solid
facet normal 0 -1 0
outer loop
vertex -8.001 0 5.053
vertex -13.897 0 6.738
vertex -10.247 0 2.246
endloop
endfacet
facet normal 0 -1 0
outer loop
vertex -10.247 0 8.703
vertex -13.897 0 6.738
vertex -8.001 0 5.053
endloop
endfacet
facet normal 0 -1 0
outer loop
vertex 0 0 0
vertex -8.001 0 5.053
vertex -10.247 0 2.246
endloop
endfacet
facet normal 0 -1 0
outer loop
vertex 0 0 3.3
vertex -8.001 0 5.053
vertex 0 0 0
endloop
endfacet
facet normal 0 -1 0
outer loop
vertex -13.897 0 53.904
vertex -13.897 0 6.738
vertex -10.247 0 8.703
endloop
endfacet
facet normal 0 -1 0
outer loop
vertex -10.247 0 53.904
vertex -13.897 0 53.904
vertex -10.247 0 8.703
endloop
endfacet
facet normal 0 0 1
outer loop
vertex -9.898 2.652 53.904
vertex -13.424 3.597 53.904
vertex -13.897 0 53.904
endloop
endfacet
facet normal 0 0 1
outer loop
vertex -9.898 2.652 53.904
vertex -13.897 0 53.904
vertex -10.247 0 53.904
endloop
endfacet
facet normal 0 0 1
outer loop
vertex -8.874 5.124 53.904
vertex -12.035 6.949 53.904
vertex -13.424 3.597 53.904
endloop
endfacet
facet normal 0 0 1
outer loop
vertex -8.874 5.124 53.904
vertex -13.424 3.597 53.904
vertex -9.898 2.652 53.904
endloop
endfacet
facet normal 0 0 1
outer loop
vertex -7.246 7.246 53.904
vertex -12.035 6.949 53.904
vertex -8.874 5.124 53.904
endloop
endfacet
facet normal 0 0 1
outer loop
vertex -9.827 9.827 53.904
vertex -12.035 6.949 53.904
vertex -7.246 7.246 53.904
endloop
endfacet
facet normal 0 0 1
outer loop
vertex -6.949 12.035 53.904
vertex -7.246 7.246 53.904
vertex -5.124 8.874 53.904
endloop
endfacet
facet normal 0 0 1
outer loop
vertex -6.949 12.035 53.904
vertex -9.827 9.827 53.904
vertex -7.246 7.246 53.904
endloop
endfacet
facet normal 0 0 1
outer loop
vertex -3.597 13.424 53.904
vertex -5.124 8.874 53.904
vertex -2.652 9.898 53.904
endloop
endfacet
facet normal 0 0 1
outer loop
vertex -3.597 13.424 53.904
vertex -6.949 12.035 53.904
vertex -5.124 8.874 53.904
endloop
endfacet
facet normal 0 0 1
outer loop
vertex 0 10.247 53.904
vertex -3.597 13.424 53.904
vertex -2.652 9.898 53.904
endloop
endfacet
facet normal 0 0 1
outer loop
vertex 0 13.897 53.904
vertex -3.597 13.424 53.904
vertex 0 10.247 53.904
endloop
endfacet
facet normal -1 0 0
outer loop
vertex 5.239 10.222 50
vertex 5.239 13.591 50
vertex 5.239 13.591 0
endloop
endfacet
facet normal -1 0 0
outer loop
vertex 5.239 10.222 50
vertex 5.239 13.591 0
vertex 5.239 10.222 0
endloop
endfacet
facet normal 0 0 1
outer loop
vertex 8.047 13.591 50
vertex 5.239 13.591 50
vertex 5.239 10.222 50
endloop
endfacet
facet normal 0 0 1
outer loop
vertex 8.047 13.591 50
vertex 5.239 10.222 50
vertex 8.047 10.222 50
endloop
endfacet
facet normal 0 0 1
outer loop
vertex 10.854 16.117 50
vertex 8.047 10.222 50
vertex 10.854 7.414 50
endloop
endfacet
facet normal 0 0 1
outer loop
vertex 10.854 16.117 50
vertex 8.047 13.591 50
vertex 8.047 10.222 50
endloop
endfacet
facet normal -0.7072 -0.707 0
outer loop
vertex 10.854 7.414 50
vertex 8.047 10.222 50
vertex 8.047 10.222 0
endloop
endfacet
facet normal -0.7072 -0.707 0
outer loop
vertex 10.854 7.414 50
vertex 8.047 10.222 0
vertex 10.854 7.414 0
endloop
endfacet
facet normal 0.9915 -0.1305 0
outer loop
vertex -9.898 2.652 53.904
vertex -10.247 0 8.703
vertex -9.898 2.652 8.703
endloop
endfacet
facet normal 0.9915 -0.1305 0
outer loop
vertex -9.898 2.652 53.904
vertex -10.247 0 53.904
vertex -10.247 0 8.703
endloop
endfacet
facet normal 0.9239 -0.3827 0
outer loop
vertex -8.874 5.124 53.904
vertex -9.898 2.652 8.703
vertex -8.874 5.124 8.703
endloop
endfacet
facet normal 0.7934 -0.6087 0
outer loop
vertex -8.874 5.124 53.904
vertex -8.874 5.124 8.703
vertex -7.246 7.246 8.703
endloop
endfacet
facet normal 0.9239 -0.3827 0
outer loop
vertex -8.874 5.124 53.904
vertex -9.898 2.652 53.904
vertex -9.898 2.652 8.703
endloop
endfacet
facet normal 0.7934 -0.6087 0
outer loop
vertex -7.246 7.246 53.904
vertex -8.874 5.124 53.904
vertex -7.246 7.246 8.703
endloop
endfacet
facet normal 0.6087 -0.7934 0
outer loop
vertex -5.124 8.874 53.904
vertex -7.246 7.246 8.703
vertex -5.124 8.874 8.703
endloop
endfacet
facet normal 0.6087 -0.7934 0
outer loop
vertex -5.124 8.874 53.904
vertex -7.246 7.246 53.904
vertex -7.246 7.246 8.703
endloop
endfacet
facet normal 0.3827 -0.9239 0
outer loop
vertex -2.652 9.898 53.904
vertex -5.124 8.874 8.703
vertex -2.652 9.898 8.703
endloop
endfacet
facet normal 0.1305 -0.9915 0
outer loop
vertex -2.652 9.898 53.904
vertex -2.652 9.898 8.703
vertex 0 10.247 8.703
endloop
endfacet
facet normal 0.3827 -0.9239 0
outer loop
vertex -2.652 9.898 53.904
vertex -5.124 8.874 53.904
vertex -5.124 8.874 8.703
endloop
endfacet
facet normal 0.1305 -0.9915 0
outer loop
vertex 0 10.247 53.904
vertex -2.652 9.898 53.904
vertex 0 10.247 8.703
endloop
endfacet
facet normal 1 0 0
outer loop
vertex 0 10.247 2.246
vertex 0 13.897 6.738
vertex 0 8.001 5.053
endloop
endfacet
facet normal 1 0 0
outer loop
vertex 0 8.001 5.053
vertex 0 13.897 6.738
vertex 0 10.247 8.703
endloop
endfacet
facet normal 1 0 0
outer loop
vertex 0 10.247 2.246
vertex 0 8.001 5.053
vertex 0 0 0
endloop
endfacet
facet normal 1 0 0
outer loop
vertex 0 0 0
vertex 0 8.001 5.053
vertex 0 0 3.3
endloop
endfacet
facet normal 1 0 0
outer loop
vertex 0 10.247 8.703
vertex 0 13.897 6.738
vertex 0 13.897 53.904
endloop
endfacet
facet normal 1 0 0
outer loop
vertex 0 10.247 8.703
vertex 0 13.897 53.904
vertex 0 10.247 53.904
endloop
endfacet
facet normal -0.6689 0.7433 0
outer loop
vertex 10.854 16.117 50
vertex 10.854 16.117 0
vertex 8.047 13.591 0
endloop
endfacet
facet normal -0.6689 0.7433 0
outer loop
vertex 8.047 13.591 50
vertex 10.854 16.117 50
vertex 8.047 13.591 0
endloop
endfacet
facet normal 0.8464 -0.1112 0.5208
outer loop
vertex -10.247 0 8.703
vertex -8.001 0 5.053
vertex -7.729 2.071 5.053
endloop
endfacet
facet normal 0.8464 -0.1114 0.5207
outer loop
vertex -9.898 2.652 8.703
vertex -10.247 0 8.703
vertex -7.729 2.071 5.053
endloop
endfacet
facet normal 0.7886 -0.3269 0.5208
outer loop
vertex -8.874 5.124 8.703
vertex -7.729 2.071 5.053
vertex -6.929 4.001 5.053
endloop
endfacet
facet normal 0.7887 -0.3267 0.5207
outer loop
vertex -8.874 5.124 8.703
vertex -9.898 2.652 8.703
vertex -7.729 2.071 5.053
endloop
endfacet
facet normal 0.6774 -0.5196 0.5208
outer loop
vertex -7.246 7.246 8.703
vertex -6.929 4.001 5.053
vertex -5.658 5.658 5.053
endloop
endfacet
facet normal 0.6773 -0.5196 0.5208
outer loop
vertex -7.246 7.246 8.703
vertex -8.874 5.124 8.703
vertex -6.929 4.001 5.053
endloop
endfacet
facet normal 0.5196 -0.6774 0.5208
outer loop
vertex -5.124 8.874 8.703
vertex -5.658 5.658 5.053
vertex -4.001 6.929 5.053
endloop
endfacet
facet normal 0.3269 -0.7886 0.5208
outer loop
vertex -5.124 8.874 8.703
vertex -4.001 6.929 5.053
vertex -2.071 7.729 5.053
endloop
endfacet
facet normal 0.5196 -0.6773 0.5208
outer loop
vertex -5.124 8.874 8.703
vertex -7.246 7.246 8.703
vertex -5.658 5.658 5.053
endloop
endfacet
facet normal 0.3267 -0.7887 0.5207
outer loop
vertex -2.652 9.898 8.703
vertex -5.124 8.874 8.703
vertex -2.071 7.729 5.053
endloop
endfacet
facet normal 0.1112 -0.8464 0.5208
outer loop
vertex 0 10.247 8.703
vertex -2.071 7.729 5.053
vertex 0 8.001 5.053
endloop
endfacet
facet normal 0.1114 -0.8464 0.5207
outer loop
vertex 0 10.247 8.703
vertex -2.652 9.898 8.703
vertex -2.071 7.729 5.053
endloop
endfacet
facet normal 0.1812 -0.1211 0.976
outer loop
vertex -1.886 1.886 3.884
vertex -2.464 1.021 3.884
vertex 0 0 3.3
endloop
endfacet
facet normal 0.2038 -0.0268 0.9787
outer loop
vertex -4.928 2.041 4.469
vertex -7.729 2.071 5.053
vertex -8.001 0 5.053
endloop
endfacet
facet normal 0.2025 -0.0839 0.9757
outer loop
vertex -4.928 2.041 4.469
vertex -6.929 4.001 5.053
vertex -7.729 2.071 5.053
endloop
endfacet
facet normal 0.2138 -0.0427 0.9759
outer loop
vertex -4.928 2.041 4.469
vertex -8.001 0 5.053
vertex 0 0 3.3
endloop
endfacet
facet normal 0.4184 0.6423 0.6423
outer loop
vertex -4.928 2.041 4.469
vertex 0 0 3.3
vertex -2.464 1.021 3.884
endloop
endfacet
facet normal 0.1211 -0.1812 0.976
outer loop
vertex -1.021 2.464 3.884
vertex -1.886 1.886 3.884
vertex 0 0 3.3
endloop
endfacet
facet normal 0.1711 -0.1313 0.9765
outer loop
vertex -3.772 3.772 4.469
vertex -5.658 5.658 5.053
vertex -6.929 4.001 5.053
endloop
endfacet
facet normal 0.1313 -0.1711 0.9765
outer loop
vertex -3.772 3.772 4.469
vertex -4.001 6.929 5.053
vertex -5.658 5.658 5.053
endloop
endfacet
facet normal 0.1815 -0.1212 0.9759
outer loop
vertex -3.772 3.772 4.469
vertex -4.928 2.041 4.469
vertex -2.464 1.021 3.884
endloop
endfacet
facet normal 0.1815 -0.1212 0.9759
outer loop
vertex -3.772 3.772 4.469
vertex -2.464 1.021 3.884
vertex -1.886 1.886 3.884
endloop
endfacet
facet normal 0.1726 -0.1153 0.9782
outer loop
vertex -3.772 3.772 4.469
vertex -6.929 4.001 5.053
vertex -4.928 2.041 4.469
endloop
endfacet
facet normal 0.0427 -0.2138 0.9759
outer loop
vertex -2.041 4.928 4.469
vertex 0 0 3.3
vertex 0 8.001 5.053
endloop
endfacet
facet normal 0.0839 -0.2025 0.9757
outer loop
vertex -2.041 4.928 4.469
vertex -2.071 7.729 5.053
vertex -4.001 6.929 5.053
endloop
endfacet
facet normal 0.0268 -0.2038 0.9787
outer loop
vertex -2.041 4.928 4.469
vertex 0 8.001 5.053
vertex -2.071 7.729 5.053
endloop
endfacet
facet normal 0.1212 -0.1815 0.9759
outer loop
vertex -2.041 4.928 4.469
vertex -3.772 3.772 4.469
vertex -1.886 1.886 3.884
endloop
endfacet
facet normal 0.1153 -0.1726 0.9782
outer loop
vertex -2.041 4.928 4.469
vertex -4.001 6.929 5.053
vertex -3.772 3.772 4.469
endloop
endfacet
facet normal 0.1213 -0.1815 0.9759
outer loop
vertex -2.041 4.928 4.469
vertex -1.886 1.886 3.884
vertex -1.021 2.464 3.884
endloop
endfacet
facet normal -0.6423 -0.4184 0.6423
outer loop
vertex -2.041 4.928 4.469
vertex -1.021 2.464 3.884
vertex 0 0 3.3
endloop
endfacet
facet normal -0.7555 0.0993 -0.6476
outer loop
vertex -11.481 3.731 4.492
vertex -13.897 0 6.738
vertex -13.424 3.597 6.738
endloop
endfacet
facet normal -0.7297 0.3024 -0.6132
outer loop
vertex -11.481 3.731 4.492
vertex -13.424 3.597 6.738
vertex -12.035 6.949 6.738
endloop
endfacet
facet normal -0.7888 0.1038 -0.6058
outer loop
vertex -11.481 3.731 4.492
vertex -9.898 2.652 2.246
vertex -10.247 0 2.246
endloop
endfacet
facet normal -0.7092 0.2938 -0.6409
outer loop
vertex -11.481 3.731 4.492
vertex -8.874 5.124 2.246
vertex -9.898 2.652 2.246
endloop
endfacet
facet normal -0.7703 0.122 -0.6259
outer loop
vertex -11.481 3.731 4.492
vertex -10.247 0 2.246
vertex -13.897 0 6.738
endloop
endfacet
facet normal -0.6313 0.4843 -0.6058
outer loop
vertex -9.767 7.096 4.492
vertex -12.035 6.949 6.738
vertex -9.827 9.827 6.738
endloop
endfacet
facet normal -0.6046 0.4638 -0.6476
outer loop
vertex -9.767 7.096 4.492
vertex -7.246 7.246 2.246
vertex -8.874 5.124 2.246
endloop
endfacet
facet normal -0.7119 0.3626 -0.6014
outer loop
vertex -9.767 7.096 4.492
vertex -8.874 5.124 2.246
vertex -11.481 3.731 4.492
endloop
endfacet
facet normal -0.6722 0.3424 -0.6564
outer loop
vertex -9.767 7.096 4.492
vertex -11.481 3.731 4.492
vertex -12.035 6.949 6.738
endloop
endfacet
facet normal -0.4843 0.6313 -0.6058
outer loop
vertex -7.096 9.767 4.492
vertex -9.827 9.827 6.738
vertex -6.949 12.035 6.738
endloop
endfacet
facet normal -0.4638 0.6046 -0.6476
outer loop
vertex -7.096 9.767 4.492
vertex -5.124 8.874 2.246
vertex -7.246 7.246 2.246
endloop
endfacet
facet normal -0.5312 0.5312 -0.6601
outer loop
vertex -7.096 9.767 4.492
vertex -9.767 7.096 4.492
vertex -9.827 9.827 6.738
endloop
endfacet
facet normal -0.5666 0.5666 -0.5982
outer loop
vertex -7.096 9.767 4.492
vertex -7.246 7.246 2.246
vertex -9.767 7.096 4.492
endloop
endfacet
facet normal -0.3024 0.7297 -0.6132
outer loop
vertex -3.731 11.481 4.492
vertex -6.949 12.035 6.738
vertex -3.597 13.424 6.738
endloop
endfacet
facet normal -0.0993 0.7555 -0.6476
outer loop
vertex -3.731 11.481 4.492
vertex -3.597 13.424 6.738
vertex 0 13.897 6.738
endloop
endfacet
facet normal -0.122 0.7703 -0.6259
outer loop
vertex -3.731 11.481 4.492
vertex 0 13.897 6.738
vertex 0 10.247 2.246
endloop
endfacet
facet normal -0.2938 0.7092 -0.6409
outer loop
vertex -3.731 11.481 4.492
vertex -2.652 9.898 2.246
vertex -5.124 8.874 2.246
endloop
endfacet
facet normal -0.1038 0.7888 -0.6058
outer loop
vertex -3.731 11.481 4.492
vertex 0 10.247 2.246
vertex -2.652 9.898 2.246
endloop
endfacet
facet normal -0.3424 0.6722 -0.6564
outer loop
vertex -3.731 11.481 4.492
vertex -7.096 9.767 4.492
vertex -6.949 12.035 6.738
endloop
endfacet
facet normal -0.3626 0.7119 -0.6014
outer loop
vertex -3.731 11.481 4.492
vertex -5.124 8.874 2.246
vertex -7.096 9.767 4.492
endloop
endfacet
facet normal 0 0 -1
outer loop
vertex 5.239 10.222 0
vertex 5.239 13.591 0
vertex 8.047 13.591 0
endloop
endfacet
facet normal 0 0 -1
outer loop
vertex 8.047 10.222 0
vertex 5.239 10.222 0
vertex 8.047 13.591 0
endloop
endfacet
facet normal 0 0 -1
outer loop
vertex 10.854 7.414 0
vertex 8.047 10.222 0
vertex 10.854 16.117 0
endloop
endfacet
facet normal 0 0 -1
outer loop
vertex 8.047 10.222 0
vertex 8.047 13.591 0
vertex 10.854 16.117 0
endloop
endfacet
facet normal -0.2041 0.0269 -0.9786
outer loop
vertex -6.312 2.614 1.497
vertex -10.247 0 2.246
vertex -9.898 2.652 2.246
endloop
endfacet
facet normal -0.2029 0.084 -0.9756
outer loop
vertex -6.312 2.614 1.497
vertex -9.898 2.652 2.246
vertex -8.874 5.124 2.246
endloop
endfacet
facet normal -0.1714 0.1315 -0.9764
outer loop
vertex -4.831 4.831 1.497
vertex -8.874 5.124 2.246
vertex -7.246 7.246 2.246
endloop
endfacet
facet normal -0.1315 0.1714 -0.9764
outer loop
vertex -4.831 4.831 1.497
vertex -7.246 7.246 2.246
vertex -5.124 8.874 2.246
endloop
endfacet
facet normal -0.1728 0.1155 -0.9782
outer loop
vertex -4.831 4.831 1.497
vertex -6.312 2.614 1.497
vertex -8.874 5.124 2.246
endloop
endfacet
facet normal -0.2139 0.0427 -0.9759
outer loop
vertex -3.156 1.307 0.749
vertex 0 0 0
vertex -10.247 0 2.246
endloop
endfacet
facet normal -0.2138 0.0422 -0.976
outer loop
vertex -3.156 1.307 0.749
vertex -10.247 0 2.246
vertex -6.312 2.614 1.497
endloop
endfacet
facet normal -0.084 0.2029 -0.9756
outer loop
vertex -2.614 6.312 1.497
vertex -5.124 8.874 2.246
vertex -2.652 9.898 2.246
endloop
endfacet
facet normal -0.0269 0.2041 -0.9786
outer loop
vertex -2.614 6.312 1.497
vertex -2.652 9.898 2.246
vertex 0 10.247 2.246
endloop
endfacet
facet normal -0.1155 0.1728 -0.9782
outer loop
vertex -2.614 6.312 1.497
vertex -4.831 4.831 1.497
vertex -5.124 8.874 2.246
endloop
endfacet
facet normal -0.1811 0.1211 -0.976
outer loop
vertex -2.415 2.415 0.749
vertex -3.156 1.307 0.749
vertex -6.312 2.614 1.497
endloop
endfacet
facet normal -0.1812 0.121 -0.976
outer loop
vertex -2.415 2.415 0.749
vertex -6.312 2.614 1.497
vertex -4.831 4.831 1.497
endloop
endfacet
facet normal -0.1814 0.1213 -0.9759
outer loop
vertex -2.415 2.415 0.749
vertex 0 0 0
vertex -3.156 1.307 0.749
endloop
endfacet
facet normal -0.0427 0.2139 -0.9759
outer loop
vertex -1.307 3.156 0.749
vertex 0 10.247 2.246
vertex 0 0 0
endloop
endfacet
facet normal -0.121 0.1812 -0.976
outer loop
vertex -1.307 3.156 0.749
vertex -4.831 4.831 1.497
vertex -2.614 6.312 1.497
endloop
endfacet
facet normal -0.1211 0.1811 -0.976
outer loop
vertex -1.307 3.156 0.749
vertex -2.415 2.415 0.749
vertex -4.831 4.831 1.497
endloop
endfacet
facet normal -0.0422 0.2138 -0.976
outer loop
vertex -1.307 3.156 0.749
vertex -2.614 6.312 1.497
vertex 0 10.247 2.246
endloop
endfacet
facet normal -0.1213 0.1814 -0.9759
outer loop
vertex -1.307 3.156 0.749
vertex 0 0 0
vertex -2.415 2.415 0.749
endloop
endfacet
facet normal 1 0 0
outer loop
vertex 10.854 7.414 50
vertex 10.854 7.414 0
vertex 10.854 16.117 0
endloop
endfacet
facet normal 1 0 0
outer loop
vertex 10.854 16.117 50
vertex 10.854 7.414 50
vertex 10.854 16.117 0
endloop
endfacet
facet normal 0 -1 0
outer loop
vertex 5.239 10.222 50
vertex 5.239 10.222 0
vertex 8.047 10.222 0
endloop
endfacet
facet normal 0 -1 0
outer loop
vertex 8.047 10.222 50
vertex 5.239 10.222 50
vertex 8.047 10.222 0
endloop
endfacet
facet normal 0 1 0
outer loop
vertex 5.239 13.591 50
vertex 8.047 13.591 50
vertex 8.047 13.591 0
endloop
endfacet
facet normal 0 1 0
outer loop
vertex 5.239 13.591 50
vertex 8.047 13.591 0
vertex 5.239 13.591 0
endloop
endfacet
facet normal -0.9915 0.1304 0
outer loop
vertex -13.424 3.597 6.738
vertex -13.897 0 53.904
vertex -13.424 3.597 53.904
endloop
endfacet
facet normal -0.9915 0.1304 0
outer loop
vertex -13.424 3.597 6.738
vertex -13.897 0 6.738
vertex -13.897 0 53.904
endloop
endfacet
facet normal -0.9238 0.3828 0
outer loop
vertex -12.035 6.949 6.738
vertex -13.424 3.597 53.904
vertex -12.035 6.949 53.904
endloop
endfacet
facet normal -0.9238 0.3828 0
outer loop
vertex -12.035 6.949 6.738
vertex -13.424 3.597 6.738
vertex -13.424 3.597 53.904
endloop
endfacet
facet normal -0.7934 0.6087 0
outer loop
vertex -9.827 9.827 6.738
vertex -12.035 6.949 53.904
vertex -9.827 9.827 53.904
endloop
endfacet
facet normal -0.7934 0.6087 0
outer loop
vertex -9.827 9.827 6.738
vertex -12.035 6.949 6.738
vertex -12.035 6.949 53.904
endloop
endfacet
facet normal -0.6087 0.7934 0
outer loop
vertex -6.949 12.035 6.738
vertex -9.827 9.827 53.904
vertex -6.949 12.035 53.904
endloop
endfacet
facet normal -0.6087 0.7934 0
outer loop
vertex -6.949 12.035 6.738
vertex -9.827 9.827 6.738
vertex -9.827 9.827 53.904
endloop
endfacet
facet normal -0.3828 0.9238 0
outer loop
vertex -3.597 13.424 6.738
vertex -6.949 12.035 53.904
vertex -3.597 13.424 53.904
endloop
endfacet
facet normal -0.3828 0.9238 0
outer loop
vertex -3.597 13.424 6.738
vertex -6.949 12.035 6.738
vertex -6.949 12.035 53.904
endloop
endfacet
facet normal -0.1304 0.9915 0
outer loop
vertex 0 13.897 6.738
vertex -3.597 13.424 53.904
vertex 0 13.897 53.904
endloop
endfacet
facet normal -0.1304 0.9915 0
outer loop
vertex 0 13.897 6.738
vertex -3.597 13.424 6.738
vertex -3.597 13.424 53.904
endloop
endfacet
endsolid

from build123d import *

# Parameters (mm, degrees)
F1_ANGLE = 90
F3_DEPTH = 50


with BuildPart() as f1:
    # F0 (on Front) → F1 (revolve)
    with BuildSketch(Plane.XZ):
        Polygon((-10.247326, 2.245989), (0, 0), (0, 3.299758), (-8.001338, 5.053476), (-10.247326, 8.703209), (-10.247326, 53.903747), (-13.897059, 53.903747), (-13.897059, 6.737968), align=None)
    revolve(axis=Axis((0, 0, 1.649879), (0, 0, -1)), revolution_arc=F1_ANGLE)


with BuildPart() as f3:
    # F2 (on Top) → F3 (new body)
    with BuildSketch(Plane.XY):
        Polygon((8.046627, 13.590597), (5.239141, 13.590597), (5.239141, 10.221612), (8.046627, 10.221612), (10.854113, 7.414125), (10.854113, 16.117334), align=None)
    extrude(amount=F3_DEPTH)


solid = Compound([f1.part, f3.part])
